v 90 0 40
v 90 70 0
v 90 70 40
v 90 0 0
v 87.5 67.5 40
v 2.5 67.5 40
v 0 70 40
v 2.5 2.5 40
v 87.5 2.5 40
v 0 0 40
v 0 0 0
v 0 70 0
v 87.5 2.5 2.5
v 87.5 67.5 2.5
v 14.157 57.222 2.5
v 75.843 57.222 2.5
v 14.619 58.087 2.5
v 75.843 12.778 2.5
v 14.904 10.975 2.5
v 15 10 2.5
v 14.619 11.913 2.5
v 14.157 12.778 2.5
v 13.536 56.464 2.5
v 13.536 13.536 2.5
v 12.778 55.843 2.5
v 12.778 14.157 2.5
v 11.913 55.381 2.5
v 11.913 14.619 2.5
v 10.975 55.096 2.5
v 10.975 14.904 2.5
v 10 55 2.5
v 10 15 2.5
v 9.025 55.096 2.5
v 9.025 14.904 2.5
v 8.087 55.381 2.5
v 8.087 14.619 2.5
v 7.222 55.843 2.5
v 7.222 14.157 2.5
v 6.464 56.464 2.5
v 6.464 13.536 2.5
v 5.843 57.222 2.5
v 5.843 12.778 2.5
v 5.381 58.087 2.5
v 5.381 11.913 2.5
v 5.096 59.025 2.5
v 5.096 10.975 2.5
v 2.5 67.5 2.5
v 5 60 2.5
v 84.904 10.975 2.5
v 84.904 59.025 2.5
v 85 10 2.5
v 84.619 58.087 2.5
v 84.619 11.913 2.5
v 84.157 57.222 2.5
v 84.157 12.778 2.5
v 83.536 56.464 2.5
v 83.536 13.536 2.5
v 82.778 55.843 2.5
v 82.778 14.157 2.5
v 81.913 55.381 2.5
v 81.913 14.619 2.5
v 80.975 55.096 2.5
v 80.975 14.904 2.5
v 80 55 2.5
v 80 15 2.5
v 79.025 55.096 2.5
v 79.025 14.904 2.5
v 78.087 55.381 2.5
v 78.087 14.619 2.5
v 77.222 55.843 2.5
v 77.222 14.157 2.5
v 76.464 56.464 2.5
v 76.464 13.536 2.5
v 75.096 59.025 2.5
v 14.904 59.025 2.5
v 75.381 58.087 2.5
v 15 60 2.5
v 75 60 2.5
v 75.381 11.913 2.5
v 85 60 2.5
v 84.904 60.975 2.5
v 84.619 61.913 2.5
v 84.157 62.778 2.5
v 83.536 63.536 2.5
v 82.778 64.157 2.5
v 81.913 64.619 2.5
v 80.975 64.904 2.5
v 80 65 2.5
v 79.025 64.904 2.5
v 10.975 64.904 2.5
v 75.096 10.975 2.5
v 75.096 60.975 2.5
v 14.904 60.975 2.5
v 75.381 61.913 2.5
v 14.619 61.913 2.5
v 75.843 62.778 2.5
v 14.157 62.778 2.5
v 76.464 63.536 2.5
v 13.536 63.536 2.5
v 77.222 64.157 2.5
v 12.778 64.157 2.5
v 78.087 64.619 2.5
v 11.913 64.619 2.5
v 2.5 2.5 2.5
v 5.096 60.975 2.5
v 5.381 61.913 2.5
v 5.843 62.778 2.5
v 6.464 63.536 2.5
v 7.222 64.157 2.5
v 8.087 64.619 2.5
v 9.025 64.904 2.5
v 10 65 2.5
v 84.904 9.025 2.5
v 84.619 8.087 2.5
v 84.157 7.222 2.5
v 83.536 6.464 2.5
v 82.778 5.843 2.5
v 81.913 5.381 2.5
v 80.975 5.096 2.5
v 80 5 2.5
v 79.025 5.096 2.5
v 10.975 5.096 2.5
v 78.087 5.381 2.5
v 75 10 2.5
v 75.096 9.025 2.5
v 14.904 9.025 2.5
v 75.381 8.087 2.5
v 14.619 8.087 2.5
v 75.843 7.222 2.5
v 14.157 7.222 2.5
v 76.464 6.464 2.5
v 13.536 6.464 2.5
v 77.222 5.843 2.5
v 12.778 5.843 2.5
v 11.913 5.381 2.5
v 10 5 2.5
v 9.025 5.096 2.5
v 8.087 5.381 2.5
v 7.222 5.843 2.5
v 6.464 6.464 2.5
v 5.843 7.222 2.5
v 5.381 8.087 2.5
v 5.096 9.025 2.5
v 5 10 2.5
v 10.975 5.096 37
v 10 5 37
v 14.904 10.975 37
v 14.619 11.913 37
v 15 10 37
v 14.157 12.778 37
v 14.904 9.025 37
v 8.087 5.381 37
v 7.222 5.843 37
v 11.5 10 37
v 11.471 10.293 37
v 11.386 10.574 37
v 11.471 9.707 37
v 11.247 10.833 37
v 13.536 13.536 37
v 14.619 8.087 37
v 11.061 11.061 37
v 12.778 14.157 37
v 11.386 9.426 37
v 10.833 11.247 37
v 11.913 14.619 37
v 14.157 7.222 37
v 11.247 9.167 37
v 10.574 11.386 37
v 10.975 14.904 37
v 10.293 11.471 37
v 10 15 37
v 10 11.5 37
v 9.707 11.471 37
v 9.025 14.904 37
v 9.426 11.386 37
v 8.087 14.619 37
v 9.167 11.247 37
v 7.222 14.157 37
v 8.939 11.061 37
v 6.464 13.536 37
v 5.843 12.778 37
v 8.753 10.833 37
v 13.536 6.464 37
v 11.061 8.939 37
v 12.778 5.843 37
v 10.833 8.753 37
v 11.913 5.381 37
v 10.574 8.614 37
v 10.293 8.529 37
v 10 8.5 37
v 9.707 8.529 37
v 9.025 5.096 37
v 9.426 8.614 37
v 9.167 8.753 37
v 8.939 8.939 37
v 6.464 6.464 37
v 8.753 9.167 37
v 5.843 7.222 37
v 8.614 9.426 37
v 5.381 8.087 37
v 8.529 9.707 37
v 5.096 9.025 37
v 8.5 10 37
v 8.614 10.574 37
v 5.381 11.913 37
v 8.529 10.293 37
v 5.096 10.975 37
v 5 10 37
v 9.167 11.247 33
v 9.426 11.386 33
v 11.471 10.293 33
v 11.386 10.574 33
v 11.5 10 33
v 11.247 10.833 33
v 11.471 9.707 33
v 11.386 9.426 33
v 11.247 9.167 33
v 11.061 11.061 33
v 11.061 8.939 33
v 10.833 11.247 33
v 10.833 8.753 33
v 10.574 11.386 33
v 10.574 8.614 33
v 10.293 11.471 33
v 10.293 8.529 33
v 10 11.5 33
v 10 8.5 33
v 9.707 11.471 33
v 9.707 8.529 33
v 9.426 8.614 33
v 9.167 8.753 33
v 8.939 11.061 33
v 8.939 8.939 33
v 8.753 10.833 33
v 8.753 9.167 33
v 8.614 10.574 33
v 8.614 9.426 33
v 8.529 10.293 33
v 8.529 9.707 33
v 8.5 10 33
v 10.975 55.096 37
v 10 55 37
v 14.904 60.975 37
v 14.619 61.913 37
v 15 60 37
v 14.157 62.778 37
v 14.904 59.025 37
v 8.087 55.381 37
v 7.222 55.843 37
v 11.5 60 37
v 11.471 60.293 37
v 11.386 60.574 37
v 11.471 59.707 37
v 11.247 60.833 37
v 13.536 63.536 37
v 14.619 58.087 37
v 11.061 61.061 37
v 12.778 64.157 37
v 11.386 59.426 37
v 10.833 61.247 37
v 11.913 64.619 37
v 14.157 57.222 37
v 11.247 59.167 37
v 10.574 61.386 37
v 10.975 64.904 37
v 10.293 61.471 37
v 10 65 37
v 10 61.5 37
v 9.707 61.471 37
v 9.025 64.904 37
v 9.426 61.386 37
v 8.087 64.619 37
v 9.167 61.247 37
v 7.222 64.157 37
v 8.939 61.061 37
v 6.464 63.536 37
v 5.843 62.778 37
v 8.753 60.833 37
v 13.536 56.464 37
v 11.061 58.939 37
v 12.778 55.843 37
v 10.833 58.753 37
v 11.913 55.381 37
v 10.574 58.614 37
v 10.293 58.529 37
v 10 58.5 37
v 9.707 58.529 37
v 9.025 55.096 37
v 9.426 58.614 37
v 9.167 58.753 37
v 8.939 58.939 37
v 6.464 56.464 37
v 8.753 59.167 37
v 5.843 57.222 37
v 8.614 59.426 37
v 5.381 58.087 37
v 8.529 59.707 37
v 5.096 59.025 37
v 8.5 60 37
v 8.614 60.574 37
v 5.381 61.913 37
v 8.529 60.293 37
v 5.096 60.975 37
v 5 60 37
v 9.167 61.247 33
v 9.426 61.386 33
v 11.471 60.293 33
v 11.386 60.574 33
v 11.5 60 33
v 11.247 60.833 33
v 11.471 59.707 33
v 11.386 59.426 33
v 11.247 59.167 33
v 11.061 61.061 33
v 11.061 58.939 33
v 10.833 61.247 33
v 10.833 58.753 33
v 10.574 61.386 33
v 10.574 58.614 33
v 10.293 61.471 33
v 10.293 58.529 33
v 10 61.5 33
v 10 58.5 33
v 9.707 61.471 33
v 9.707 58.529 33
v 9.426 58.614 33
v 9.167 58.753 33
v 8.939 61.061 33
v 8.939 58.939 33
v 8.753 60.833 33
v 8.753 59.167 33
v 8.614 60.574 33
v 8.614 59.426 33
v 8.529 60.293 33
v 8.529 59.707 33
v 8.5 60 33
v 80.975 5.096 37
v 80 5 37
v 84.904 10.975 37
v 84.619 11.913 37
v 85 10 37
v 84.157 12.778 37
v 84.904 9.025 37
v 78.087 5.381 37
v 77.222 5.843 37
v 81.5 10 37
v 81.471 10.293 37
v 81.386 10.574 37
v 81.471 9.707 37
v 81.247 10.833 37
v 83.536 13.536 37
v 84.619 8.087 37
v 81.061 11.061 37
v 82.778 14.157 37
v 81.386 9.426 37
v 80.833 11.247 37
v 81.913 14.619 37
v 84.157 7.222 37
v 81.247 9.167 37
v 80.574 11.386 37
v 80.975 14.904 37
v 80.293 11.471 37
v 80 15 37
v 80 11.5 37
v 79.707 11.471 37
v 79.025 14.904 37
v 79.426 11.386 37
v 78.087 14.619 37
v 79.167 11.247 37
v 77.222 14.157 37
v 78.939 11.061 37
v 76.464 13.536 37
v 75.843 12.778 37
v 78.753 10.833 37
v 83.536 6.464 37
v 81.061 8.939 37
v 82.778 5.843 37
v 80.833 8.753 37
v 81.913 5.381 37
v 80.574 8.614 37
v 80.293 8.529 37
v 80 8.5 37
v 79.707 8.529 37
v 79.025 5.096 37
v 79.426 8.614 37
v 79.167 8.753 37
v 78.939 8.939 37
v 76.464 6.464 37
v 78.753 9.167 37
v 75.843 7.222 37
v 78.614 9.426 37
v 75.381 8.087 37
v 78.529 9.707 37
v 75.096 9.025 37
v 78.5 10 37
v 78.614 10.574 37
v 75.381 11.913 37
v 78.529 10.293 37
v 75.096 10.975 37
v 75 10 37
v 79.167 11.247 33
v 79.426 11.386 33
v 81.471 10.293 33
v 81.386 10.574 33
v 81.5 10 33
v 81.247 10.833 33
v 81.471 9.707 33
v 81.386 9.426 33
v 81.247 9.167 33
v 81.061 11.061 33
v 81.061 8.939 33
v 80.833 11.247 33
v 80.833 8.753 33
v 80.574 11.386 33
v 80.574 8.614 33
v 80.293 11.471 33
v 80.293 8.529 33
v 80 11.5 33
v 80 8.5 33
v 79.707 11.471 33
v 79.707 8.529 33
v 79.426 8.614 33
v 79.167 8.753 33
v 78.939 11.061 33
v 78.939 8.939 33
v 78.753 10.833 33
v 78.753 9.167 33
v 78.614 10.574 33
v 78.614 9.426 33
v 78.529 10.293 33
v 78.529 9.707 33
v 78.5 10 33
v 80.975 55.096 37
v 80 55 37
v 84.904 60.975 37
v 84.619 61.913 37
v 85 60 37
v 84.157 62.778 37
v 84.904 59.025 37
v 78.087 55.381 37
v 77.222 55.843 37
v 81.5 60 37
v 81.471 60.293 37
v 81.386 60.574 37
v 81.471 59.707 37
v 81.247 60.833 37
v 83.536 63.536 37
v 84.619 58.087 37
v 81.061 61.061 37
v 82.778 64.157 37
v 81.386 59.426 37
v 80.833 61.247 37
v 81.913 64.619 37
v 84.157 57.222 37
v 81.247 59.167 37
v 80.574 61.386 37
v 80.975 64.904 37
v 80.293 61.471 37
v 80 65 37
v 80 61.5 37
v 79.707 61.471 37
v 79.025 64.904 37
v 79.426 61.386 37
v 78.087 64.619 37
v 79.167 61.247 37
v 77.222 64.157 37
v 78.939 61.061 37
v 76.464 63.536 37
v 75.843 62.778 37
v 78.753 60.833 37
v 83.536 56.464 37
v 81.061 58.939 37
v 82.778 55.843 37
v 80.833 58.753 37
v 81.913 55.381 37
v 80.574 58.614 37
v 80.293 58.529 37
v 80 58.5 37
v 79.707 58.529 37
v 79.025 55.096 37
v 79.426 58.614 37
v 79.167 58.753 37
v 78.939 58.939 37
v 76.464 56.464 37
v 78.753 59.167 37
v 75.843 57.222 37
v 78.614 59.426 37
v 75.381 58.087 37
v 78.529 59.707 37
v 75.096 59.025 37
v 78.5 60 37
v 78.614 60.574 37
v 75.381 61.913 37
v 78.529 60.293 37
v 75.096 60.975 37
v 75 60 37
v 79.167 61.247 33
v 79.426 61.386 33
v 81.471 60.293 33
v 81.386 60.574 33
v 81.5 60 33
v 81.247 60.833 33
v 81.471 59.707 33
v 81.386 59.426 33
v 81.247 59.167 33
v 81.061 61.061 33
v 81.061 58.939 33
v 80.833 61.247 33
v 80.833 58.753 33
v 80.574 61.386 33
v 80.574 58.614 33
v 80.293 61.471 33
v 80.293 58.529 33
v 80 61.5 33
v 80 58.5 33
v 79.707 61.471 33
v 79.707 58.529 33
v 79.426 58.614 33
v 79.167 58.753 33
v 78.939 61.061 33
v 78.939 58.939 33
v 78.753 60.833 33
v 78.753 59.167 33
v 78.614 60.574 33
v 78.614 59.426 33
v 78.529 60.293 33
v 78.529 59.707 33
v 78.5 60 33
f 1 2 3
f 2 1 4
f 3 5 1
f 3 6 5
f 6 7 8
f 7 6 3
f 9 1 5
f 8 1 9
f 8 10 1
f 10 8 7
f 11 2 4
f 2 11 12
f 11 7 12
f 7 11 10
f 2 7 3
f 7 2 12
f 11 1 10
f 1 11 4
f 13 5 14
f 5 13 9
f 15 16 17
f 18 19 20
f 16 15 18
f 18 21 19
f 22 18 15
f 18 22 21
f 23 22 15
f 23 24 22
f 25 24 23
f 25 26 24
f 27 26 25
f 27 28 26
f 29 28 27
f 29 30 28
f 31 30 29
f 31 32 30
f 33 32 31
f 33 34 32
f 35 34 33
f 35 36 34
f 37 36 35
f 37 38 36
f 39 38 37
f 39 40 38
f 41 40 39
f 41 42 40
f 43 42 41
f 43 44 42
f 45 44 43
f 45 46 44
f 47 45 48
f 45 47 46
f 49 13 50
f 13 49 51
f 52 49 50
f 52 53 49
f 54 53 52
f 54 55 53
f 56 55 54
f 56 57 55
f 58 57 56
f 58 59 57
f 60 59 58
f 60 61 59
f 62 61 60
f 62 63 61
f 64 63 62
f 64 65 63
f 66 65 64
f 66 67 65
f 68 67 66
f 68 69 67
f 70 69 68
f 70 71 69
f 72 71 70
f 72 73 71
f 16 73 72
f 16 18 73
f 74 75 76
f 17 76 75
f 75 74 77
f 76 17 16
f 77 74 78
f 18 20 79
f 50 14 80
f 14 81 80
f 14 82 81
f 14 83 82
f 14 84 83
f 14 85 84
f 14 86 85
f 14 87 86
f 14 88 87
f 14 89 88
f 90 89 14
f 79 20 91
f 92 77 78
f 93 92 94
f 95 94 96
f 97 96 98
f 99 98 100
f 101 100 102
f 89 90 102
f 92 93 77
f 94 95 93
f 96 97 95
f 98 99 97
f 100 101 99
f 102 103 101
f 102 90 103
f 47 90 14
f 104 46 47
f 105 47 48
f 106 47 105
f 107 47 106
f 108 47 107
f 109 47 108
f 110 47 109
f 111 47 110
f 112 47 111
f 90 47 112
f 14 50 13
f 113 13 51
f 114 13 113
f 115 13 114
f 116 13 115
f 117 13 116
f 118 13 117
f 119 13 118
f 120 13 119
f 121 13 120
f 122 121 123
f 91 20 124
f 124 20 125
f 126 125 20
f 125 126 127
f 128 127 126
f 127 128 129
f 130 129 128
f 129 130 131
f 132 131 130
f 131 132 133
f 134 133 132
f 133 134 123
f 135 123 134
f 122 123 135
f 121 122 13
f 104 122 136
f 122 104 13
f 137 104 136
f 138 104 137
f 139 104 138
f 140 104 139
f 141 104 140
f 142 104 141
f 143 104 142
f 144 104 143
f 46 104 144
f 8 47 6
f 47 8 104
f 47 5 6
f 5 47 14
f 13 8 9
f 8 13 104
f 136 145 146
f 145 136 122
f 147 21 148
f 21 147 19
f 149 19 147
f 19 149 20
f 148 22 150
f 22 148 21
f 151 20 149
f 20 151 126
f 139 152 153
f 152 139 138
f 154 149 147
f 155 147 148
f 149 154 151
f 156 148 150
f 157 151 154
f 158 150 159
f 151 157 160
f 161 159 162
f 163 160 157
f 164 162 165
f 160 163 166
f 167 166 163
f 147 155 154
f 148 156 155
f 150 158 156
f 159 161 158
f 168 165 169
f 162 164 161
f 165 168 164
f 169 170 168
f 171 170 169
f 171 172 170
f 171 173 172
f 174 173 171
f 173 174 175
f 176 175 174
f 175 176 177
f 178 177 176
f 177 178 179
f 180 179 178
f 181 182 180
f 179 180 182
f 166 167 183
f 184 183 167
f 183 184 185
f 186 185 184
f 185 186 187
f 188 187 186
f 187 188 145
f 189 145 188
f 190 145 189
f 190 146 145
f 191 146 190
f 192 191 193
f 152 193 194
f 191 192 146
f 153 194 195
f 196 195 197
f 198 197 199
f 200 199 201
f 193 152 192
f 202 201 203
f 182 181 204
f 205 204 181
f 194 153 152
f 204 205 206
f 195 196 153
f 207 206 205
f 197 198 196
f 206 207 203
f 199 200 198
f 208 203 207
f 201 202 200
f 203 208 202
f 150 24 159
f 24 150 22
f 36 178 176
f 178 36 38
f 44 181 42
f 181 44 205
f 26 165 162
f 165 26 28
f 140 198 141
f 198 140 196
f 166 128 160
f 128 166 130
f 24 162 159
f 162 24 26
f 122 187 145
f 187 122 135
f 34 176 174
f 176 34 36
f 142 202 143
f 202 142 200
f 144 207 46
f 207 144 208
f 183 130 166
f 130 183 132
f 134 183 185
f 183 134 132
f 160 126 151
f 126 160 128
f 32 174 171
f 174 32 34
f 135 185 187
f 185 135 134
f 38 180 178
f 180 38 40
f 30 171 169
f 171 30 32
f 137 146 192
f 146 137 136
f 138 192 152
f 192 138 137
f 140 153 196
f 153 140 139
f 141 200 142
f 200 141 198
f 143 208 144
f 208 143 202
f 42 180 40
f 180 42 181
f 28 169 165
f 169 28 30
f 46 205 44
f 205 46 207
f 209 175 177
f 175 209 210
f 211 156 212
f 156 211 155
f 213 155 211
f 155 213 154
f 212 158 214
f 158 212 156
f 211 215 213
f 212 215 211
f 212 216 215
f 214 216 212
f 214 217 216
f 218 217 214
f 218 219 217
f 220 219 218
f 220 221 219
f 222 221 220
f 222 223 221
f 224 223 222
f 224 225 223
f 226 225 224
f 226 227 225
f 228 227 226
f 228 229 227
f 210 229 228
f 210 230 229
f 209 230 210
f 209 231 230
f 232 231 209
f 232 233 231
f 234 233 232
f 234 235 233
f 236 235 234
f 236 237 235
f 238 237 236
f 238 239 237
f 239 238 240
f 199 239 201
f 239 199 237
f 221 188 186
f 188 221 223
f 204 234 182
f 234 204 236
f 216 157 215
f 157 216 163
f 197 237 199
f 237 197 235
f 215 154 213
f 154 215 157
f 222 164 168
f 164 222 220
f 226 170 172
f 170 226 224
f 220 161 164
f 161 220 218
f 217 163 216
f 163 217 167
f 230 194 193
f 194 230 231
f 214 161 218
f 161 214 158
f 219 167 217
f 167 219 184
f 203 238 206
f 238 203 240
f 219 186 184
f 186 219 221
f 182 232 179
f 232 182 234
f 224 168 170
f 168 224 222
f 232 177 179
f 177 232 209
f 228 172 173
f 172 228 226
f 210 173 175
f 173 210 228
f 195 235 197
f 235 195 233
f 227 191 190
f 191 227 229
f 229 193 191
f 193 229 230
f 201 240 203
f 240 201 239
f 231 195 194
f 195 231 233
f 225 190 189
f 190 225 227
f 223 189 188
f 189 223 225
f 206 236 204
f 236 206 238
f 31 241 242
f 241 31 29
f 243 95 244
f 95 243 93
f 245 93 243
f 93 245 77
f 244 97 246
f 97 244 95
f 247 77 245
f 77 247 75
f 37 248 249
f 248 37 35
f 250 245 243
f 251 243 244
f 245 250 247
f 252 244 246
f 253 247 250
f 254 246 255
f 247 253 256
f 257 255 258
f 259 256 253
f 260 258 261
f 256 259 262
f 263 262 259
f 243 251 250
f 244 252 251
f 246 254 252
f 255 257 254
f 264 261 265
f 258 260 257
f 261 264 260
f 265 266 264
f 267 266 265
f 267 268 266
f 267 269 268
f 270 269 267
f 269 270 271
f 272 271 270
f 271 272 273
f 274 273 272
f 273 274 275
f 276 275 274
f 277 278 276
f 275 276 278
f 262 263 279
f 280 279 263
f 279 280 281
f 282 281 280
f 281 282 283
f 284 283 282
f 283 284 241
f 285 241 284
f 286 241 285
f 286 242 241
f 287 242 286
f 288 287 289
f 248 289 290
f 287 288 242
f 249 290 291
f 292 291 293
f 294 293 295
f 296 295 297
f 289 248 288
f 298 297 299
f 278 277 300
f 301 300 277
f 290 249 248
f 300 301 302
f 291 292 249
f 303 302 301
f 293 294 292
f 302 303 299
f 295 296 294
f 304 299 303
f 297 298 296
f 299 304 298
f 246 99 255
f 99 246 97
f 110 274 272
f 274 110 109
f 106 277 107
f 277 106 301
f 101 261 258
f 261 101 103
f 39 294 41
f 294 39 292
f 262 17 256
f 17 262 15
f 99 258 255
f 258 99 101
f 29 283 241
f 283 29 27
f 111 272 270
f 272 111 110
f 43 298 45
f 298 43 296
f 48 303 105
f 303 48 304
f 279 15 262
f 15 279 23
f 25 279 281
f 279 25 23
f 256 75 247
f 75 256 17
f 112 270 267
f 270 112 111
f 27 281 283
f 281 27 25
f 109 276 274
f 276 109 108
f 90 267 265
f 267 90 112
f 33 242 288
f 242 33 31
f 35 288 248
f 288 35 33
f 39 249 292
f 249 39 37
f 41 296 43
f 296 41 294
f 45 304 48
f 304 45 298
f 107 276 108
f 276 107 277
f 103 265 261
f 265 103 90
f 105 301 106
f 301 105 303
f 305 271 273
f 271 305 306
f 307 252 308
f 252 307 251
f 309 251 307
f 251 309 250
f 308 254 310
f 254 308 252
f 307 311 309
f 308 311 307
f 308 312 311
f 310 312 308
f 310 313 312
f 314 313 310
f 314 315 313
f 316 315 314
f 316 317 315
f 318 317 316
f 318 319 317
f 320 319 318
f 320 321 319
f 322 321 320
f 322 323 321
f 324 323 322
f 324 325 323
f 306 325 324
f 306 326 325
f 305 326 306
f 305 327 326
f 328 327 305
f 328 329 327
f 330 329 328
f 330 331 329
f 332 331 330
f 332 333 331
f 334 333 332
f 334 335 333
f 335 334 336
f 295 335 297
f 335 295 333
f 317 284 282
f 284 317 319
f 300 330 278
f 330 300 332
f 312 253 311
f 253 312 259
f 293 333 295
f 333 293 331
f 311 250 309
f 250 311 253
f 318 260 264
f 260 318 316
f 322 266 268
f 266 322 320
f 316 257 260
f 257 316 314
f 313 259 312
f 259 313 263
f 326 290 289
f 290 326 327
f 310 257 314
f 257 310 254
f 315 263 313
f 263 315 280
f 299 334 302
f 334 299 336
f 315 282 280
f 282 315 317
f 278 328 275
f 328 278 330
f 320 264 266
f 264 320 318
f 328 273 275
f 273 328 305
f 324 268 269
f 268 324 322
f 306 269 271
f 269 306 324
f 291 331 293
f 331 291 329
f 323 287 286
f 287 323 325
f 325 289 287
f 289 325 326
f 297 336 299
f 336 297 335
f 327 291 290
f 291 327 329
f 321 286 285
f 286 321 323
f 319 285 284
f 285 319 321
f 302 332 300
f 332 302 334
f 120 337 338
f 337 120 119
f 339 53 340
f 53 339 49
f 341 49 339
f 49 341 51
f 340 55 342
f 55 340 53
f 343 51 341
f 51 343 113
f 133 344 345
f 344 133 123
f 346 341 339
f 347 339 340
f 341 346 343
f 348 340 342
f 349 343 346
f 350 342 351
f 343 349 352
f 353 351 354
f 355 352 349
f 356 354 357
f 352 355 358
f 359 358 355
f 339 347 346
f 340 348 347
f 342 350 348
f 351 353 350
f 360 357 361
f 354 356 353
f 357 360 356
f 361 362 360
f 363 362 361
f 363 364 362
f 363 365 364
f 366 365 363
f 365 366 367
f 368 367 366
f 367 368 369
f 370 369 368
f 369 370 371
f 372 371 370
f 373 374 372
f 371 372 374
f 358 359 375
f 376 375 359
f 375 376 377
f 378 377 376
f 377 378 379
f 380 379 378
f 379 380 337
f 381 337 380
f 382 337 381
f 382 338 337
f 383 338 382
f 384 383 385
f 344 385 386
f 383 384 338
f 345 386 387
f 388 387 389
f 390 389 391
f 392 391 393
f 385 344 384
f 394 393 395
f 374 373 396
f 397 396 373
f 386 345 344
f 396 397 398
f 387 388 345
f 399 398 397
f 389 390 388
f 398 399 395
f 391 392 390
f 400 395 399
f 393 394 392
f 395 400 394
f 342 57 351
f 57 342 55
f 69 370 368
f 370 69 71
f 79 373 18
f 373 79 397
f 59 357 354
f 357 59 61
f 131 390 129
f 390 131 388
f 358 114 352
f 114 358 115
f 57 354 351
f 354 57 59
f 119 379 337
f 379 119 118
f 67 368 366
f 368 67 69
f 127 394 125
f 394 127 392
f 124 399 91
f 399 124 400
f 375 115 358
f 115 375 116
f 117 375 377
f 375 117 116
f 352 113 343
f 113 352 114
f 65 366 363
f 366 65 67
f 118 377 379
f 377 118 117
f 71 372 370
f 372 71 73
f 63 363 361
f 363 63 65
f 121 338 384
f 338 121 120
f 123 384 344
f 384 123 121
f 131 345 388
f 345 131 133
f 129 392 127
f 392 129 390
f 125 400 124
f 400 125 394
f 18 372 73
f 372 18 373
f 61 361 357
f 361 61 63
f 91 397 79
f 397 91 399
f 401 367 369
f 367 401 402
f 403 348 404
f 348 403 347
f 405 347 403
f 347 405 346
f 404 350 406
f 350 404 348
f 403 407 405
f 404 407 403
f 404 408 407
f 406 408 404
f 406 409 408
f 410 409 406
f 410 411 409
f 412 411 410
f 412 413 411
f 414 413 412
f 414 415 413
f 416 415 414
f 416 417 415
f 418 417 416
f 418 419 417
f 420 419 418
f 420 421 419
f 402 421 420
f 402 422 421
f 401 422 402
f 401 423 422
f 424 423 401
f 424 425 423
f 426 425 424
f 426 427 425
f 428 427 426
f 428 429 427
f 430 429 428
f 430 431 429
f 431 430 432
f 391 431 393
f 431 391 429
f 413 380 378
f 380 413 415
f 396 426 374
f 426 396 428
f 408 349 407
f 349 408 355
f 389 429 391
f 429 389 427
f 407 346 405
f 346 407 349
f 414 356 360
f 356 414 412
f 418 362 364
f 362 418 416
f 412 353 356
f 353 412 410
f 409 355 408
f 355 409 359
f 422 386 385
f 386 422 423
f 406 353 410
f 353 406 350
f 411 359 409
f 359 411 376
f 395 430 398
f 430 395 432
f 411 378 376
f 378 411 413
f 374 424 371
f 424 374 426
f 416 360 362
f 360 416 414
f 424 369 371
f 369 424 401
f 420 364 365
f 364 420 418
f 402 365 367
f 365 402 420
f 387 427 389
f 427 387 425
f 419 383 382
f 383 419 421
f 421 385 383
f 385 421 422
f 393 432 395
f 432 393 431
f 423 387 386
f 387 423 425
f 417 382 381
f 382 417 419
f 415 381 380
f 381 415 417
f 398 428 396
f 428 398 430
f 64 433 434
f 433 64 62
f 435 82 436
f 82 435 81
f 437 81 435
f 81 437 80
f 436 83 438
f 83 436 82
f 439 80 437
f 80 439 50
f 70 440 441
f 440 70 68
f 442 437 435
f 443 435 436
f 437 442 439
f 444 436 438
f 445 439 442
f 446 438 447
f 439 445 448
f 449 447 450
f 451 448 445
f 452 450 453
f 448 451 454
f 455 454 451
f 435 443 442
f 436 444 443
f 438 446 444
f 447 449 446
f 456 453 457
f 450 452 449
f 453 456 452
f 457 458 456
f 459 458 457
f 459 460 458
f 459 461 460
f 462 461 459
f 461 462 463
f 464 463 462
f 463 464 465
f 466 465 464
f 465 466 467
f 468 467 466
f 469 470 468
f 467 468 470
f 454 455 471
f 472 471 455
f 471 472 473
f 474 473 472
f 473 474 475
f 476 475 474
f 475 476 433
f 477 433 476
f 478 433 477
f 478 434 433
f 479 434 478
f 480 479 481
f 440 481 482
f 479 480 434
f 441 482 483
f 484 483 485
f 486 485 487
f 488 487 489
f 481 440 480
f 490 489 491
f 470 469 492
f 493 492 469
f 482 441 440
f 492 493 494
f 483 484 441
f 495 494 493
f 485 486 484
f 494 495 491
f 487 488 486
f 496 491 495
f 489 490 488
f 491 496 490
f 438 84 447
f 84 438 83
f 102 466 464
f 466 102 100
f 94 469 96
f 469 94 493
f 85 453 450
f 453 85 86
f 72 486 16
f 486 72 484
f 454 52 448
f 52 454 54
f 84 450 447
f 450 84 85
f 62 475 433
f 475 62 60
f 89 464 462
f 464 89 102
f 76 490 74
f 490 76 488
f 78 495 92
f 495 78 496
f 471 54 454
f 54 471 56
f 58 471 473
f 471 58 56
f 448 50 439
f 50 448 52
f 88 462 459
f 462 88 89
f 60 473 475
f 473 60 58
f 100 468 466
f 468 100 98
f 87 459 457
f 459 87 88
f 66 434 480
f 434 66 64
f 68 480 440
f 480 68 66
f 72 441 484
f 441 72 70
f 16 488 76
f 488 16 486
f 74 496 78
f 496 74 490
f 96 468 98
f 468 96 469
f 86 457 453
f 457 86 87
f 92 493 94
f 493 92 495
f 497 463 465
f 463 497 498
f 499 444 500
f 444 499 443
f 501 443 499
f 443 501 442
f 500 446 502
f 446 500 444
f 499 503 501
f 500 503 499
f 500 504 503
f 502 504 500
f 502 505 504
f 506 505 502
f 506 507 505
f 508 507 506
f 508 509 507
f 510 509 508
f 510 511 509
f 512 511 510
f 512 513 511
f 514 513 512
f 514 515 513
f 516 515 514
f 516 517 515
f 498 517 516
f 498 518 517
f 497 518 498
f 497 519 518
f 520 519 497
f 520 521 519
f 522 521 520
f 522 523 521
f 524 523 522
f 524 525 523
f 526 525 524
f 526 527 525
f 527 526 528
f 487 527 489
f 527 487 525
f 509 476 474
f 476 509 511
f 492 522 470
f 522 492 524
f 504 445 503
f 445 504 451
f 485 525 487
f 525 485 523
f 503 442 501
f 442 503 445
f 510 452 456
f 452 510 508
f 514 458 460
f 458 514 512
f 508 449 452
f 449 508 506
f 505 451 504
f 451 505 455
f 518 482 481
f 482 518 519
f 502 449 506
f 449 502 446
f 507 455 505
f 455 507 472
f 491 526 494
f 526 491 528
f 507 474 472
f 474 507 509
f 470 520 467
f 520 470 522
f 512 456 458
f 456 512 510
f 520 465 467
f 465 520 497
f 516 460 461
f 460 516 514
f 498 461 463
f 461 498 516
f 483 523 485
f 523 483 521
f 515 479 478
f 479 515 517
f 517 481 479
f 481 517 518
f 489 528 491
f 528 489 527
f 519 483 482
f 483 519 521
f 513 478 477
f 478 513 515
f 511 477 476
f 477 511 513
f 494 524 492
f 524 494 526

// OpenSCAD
$fn = 32;

// ----------------------------------------------------------------------
// Enclosure box: bosses enclosure
// ----------------------------------------------------------------------

// --- parameters (mm) ---
box_l = 90;               // outer length, X
box_w = 70;               // outer width, Y
box_h = 40;               // outer height
wall_t = 2.5;             // wall thickness
boss_r = 5;               // corner boss radius
hole_r = 1.5;             // boss screw hole radius
boss_in = 10;             // boss inset from the corners

inner_h = box_h - wall_t;  // cavity depth
boss_h = inner_h - 2;  // corner boss height

difference() {
  union() {
    difference() {
      cube([box_l, box_w, box_h]);
      translate([wall_t, wall_t, wall_t])
        cube([box_l - 2 * wall_t, box_w - 2 * wall_t, box_h]);
    }
    for (sx = [0, 1], sy = [0, 1])
      translate([sx ? box_l - boss_in : boss_in,
                 sy ? box_w - boss_in : boss_in, wall_t - 1])
        difference() {
          cylinder(r = boss_r, h = boss_h);
          translate([0, 0, boss_h - 4])
            cylinder(r = hole_r, h = 5);
        }
  }
}
